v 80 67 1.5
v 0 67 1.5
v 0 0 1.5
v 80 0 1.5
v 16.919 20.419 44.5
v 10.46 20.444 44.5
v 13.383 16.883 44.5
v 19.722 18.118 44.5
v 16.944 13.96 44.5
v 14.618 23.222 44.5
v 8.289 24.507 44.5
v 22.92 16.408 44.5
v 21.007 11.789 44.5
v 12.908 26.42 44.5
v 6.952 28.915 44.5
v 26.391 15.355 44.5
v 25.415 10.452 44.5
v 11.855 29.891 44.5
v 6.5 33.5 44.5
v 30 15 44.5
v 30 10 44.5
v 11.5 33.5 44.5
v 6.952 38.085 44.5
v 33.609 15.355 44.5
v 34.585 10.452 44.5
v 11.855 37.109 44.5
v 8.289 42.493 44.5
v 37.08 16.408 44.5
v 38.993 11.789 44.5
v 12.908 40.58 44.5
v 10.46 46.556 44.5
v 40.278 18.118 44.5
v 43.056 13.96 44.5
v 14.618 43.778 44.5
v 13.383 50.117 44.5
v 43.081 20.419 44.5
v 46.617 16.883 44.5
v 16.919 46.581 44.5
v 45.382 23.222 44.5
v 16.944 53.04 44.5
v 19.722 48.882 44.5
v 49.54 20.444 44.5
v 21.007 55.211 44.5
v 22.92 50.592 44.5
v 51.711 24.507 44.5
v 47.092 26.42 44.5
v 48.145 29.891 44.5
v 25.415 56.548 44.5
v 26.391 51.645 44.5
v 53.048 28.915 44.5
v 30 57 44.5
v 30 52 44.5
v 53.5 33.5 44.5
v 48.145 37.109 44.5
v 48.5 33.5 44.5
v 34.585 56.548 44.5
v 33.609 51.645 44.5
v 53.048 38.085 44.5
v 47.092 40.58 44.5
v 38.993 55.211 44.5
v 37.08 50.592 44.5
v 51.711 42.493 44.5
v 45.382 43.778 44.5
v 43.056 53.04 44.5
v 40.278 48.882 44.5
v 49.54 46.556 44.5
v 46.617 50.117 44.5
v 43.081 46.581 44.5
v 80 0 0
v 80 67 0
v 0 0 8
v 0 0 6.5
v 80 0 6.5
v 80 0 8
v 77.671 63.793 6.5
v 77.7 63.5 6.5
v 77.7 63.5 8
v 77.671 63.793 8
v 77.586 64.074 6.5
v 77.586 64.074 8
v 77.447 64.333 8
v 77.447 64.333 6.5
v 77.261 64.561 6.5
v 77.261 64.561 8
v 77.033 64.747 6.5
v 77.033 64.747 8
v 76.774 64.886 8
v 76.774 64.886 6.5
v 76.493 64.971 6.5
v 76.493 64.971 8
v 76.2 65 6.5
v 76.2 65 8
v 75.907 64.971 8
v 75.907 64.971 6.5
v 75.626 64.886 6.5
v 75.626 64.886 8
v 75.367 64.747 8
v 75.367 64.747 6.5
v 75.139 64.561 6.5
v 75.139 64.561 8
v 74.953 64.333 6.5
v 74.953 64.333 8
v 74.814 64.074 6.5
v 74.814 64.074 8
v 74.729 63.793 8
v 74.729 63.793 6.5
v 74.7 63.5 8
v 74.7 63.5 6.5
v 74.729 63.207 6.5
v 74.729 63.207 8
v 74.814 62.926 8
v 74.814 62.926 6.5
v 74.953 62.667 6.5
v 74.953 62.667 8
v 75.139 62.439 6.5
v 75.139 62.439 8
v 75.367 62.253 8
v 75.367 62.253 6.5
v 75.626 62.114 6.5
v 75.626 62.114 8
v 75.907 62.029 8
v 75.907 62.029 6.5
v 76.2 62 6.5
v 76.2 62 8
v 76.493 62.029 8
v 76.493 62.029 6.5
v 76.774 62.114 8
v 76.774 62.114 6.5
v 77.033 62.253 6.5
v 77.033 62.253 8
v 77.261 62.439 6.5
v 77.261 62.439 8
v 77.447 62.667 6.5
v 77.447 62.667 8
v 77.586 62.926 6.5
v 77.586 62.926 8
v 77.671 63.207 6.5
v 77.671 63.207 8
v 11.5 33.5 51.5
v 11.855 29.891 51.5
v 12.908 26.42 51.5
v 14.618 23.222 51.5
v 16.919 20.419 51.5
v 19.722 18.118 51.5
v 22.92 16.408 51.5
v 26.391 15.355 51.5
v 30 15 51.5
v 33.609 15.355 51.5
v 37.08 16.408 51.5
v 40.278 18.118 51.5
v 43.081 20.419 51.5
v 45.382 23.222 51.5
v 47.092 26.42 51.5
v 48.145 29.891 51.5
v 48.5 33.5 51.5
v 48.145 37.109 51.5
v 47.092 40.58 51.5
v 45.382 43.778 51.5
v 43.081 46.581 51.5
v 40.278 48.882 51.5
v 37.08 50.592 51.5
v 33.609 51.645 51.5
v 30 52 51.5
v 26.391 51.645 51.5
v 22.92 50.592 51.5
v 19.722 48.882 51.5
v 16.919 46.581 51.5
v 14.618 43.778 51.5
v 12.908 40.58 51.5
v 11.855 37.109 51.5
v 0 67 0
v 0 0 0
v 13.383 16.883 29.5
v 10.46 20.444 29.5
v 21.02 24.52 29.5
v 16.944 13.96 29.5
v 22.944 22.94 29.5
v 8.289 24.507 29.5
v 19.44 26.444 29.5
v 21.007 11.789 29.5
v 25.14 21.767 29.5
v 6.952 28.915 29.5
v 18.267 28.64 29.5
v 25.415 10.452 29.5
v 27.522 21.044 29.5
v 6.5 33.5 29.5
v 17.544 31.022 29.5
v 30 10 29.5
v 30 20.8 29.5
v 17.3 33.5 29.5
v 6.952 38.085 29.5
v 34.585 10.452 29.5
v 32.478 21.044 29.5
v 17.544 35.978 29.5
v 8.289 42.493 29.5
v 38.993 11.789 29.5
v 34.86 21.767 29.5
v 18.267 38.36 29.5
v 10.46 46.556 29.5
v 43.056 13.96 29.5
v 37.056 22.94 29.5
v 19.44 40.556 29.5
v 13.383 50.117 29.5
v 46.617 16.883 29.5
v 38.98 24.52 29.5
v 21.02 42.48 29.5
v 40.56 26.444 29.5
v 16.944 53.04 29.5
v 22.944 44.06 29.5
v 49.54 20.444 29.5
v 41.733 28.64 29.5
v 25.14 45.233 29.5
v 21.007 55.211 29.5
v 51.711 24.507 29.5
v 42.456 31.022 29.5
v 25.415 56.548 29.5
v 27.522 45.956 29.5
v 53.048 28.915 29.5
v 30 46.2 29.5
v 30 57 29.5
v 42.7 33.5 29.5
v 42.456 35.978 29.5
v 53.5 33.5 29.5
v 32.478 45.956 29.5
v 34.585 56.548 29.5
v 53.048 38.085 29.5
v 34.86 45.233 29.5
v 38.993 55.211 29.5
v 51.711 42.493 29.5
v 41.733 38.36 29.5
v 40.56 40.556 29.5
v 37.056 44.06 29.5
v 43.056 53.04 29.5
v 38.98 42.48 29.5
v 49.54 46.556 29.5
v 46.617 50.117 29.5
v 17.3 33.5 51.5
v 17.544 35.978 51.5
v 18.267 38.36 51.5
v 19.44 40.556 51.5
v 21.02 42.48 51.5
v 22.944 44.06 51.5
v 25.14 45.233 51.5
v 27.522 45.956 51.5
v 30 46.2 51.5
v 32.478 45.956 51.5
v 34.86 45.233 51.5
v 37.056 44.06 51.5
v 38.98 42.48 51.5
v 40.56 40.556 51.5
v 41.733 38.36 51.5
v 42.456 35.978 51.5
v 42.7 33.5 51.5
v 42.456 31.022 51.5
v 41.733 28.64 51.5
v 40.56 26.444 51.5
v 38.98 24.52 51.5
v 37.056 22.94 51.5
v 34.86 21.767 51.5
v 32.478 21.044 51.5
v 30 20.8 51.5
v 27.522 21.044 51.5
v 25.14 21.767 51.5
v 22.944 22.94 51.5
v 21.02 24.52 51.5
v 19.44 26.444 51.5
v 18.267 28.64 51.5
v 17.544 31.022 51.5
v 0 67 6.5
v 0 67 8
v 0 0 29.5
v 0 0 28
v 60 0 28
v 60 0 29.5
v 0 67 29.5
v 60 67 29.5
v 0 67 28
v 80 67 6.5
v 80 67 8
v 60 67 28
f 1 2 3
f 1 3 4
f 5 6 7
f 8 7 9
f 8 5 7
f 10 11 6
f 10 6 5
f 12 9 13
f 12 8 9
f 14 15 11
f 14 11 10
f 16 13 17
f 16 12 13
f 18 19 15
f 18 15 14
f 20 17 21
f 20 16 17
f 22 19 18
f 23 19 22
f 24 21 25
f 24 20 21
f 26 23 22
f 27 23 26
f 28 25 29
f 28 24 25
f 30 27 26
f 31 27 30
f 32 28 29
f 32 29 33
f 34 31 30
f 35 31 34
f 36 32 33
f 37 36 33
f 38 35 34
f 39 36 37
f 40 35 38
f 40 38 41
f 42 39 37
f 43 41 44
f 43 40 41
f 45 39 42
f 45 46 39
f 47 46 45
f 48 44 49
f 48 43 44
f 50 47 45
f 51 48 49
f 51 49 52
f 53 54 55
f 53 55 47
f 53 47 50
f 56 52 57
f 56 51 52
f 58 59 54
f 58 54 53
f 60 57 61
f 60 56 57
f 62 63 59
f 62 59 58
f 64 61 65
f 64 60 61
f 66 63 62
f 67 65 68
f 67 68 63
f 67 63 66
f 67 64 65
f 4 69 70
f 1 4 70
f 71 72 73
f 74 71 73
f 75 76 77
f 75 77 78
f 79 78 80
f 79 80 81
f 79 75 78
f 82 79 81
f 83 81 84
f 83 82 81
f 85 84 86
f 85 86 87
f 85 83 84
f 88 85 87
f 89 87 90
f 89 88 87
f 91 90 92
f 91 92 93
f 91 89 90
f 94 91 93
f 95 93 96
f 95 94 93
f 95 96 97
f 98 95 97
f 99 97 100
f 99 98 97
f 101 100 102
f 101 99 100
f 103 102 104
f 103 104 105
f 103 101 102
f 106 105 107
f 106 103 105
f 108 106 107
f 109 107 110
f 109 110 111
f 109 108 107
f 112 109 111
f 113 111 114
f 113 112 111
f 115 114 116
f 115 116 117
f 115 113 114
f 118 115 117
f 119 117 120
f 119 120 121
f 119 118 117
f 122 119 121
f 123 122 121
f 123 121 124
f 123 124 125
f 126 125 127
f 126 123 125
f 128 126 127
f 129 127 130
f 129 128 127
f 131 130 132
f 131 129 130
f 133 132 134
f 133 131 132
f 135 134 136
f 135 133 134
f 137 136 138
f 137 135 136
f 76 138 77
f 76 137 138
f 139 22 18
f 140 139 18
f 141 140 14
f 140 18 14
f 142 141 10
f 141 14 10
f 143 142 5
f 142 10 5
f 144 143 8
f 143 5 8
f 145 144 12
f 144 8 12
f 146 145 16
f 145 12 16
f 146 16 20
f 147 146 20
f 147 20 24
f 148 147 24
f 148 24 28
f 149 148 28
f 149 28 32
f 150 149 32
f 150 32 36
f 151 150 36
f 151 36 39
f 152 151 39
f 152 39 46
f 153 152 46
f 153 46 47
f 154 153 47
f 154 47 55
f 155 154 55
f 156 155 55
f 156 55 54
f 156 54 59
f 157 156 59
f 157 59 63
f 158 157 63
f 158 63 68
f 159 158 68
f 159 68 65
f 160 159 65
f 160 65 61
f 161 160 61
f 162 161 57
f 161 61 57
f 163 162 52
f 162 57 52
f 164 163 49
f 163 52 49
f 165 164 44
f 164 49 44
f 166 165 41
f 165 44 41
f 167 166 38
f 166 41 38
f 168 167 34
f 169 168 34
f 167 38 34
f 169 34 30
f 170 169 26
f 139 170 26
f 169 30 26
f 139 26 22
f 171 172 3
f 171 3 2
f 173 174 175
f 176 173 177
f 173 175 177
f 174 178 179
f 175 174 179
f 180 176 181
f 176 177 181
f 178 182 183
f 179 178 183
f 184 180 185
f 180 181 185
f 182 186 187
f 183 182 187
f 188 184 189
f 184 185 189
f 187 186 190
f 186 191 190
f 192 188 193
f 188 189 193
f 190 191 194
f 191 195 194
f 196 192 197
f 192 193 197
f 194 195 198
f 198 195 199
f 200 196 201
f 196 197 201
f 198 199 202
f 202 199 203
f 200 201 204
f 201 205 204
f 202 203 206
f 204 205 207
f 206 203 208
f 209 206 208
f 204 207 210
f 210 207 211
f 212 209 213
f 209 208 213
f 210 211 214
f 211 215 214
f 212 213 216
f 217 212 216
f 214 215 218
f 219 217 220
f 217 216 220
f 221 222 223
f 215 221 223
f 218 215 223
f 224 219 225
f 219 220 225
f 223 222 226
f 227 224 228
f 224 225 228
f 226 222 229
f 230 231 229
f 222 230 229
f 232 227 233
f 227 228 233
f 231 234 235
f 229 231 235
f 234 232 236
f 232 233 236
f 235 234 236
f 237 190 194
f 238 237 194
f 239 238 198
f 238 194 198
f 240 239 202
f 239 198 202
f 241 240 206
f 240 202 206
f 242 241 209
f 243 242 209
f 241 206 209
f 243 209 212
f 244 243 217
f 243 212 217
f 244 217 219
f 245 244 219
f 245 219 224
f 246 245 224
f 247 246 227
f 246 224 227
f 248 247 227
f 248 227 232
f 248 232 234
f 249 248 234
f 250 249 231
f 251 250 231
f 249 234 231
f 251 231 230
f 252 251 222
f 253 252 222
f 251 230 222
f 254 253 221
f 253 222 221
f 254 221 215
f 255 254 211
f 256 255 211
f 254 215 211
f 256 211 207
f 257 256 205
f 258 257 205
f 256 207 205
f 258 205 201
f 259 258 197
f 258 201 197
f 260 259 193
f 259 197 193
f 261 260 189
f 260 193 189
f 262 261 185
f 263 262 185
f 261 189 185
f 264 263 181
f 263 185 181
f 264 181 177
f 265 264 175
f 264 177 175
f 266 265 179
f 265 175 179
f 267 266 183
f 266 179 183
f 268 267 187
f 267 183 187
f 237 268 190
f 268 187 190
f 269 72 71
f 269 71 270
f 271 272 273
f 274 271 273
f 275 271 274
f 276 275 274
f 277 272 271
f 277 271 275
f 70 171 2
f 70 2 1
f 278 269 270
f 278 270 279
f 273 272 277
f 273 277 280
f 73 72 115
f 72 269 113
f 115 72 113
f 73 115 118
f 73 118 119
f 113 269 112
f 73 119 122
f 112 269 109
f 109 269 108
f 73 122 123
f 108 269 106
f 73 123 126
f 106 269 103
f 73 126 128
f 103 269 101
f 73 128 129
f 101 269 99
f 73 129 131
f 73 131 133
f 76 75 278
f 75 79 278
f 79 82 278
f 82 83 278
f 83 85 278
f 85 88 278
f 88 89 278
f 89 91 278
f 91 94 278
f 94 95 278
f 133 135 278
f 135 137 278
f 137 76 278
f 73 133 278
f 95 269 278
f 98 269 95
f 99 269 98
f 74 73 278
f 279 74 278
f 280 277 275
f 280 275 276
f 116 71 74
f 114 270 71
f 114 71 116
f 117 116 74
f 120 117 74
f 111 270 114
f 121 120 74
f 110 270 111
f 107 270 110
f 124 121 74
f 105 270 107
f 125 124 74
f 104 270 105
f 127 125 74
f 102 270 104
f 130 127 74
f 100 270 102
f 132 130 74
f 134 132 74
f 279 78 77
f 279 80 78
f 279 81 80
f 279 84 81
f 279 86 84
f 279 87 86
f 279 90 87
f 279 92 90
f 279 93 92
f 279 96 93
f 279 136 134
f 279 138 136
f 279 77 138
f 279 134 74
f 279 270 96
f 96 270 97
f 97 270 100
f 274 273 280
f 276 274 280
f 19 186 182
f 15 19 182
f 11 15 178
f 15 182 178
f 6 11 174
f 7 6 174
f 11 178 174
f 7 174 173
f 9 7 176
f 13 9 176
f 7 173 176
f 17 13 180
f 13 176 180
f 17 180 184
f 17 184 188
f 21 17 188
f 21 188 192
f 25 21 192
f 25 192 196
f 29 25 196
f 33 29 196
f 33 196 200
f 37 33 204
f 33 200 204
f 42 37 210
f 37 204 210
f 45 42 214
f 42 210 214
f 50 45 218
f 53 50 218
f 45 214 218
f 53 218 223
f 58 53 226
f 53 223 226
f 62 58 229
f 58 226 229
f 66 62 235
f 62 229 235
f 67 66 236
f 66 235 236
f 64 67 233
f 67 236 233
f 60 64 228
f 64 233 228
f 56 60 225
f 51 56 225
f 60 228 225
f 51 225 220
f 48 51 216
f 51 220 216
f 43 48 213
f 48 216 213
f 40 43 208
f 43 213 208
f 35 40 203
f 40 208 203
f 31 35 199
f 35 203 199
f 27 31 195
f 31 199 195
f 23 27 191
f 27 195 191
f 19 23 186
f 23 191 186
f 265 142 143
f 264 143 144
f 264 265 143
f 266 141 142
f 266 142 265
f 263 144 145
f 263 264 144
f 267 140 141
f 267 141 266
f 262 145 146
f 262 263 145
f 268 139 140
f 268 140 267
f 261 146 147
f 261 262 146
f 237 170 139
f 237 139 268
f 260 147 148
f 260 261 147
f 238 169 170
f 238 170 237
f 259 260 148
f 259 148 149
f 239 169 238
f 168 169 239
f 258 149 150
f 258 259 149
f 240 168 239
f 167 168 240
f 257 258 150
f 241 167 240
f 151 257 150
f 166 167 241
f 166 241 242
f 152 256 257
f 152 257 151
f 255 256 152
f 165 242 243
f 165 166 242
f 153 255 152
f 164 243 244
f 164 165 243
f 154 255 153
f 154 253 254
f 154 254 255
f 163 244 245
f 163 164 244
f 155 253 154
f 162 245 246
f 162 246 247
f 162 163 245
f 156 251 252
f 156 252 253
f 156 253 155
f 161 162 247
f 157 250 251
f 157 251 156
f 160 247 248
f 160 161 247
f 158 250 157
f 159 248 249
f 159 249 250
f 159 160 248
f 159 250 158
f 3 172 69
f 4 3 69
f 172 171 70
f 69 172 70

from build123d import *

# Parameters (mm, degrees)
F0_W      = 80
F0_H      = 67
F1_DEPTH  = 1.5
F3_W      = 80
F3_H      = 67
F3_R      = 1.5
F4_DEPTH  = 1.5
F6_W      = 60
F6_H      = 67
F7_DEPTH  = 1.5
F9_DEPTH  = 15
F10_DEPTH = 22


with BuildPart() as f1:
    # F0 (on Top) → F1 (new body)
    with BuildSketch(Plane.XY):
        with Locations((40, 33.5)):
            Rectangle(F0_W, F0_H)
    extrude(amount=F1_DEPTH)


with BuildPart() as f4:
    # F3 (on offset) → F4 (new body)
    with BuildSketch(Plane.XY.offset(6.5)):
        with Locations((40, 33.5)):
            Rectangle(F3_W, F3_H)
        with Locations((76.2, 63.5)):
            Circle(F3_R, mode=Mode.SUBTRACT)
    extrude(amount=F4_DEPTH)


with BuildPart() as f7:
    # F6 (on offset) → F7 (new body)
    with BuildSketch(Plane.XY.offset(28)):
        with Locations((30, 33.5)):
            Rectangle(F6_W, F6_H)
    extrude(amount=F7_DEPTH)


with BuildPart() as f9:
    # F8 (on face) → F9 (new body)
    with BuildSketch(Plane.XY.offset(29.5)):
        with BuildLine():
            ThreePointArc((53.5, 33.5), (30, 57), (6.5, 33.5))
            ThreePointArc((6.5, 33.5), (30, 10), (53.5, 33.5))
        make_face()
        with BuildLine():
            ThreePointArc((48.5, 33.5), (30, 15), (11.5, 33.5))
            ThreePointArc((11.5, 33.5), (30, 52), (48.5, 33.5))
        make_face(mode=Mode.SUBTRACT)
    extrude(amount=F9_DEPTH)

    # F8 (on face) → F10 (join)
    with BuildSketch(Plane.XY.offset(29.5)):
        with BuildLine():
            ThreePointArc((48.5, 33.5), (30, 52), (11.5, 33.5))
            ThreePointArc((11.5, 33.5), (30, 15), (48.5, 33.5))
        make_face()
        with BuildLine():
            ThreePointArc((42.7, 33.5), (30, 20.8), (17.3, 33.5))
            ThreePointArc((17.3, 33.5), (30, 46.2), (42.7, 33.5))
        make_face(mode=Mode.SUBTRACT)
    extrude(amount=F10_DEPTH)


solid = Compound([f1.part, f4.part, f7.part, f9.part])
